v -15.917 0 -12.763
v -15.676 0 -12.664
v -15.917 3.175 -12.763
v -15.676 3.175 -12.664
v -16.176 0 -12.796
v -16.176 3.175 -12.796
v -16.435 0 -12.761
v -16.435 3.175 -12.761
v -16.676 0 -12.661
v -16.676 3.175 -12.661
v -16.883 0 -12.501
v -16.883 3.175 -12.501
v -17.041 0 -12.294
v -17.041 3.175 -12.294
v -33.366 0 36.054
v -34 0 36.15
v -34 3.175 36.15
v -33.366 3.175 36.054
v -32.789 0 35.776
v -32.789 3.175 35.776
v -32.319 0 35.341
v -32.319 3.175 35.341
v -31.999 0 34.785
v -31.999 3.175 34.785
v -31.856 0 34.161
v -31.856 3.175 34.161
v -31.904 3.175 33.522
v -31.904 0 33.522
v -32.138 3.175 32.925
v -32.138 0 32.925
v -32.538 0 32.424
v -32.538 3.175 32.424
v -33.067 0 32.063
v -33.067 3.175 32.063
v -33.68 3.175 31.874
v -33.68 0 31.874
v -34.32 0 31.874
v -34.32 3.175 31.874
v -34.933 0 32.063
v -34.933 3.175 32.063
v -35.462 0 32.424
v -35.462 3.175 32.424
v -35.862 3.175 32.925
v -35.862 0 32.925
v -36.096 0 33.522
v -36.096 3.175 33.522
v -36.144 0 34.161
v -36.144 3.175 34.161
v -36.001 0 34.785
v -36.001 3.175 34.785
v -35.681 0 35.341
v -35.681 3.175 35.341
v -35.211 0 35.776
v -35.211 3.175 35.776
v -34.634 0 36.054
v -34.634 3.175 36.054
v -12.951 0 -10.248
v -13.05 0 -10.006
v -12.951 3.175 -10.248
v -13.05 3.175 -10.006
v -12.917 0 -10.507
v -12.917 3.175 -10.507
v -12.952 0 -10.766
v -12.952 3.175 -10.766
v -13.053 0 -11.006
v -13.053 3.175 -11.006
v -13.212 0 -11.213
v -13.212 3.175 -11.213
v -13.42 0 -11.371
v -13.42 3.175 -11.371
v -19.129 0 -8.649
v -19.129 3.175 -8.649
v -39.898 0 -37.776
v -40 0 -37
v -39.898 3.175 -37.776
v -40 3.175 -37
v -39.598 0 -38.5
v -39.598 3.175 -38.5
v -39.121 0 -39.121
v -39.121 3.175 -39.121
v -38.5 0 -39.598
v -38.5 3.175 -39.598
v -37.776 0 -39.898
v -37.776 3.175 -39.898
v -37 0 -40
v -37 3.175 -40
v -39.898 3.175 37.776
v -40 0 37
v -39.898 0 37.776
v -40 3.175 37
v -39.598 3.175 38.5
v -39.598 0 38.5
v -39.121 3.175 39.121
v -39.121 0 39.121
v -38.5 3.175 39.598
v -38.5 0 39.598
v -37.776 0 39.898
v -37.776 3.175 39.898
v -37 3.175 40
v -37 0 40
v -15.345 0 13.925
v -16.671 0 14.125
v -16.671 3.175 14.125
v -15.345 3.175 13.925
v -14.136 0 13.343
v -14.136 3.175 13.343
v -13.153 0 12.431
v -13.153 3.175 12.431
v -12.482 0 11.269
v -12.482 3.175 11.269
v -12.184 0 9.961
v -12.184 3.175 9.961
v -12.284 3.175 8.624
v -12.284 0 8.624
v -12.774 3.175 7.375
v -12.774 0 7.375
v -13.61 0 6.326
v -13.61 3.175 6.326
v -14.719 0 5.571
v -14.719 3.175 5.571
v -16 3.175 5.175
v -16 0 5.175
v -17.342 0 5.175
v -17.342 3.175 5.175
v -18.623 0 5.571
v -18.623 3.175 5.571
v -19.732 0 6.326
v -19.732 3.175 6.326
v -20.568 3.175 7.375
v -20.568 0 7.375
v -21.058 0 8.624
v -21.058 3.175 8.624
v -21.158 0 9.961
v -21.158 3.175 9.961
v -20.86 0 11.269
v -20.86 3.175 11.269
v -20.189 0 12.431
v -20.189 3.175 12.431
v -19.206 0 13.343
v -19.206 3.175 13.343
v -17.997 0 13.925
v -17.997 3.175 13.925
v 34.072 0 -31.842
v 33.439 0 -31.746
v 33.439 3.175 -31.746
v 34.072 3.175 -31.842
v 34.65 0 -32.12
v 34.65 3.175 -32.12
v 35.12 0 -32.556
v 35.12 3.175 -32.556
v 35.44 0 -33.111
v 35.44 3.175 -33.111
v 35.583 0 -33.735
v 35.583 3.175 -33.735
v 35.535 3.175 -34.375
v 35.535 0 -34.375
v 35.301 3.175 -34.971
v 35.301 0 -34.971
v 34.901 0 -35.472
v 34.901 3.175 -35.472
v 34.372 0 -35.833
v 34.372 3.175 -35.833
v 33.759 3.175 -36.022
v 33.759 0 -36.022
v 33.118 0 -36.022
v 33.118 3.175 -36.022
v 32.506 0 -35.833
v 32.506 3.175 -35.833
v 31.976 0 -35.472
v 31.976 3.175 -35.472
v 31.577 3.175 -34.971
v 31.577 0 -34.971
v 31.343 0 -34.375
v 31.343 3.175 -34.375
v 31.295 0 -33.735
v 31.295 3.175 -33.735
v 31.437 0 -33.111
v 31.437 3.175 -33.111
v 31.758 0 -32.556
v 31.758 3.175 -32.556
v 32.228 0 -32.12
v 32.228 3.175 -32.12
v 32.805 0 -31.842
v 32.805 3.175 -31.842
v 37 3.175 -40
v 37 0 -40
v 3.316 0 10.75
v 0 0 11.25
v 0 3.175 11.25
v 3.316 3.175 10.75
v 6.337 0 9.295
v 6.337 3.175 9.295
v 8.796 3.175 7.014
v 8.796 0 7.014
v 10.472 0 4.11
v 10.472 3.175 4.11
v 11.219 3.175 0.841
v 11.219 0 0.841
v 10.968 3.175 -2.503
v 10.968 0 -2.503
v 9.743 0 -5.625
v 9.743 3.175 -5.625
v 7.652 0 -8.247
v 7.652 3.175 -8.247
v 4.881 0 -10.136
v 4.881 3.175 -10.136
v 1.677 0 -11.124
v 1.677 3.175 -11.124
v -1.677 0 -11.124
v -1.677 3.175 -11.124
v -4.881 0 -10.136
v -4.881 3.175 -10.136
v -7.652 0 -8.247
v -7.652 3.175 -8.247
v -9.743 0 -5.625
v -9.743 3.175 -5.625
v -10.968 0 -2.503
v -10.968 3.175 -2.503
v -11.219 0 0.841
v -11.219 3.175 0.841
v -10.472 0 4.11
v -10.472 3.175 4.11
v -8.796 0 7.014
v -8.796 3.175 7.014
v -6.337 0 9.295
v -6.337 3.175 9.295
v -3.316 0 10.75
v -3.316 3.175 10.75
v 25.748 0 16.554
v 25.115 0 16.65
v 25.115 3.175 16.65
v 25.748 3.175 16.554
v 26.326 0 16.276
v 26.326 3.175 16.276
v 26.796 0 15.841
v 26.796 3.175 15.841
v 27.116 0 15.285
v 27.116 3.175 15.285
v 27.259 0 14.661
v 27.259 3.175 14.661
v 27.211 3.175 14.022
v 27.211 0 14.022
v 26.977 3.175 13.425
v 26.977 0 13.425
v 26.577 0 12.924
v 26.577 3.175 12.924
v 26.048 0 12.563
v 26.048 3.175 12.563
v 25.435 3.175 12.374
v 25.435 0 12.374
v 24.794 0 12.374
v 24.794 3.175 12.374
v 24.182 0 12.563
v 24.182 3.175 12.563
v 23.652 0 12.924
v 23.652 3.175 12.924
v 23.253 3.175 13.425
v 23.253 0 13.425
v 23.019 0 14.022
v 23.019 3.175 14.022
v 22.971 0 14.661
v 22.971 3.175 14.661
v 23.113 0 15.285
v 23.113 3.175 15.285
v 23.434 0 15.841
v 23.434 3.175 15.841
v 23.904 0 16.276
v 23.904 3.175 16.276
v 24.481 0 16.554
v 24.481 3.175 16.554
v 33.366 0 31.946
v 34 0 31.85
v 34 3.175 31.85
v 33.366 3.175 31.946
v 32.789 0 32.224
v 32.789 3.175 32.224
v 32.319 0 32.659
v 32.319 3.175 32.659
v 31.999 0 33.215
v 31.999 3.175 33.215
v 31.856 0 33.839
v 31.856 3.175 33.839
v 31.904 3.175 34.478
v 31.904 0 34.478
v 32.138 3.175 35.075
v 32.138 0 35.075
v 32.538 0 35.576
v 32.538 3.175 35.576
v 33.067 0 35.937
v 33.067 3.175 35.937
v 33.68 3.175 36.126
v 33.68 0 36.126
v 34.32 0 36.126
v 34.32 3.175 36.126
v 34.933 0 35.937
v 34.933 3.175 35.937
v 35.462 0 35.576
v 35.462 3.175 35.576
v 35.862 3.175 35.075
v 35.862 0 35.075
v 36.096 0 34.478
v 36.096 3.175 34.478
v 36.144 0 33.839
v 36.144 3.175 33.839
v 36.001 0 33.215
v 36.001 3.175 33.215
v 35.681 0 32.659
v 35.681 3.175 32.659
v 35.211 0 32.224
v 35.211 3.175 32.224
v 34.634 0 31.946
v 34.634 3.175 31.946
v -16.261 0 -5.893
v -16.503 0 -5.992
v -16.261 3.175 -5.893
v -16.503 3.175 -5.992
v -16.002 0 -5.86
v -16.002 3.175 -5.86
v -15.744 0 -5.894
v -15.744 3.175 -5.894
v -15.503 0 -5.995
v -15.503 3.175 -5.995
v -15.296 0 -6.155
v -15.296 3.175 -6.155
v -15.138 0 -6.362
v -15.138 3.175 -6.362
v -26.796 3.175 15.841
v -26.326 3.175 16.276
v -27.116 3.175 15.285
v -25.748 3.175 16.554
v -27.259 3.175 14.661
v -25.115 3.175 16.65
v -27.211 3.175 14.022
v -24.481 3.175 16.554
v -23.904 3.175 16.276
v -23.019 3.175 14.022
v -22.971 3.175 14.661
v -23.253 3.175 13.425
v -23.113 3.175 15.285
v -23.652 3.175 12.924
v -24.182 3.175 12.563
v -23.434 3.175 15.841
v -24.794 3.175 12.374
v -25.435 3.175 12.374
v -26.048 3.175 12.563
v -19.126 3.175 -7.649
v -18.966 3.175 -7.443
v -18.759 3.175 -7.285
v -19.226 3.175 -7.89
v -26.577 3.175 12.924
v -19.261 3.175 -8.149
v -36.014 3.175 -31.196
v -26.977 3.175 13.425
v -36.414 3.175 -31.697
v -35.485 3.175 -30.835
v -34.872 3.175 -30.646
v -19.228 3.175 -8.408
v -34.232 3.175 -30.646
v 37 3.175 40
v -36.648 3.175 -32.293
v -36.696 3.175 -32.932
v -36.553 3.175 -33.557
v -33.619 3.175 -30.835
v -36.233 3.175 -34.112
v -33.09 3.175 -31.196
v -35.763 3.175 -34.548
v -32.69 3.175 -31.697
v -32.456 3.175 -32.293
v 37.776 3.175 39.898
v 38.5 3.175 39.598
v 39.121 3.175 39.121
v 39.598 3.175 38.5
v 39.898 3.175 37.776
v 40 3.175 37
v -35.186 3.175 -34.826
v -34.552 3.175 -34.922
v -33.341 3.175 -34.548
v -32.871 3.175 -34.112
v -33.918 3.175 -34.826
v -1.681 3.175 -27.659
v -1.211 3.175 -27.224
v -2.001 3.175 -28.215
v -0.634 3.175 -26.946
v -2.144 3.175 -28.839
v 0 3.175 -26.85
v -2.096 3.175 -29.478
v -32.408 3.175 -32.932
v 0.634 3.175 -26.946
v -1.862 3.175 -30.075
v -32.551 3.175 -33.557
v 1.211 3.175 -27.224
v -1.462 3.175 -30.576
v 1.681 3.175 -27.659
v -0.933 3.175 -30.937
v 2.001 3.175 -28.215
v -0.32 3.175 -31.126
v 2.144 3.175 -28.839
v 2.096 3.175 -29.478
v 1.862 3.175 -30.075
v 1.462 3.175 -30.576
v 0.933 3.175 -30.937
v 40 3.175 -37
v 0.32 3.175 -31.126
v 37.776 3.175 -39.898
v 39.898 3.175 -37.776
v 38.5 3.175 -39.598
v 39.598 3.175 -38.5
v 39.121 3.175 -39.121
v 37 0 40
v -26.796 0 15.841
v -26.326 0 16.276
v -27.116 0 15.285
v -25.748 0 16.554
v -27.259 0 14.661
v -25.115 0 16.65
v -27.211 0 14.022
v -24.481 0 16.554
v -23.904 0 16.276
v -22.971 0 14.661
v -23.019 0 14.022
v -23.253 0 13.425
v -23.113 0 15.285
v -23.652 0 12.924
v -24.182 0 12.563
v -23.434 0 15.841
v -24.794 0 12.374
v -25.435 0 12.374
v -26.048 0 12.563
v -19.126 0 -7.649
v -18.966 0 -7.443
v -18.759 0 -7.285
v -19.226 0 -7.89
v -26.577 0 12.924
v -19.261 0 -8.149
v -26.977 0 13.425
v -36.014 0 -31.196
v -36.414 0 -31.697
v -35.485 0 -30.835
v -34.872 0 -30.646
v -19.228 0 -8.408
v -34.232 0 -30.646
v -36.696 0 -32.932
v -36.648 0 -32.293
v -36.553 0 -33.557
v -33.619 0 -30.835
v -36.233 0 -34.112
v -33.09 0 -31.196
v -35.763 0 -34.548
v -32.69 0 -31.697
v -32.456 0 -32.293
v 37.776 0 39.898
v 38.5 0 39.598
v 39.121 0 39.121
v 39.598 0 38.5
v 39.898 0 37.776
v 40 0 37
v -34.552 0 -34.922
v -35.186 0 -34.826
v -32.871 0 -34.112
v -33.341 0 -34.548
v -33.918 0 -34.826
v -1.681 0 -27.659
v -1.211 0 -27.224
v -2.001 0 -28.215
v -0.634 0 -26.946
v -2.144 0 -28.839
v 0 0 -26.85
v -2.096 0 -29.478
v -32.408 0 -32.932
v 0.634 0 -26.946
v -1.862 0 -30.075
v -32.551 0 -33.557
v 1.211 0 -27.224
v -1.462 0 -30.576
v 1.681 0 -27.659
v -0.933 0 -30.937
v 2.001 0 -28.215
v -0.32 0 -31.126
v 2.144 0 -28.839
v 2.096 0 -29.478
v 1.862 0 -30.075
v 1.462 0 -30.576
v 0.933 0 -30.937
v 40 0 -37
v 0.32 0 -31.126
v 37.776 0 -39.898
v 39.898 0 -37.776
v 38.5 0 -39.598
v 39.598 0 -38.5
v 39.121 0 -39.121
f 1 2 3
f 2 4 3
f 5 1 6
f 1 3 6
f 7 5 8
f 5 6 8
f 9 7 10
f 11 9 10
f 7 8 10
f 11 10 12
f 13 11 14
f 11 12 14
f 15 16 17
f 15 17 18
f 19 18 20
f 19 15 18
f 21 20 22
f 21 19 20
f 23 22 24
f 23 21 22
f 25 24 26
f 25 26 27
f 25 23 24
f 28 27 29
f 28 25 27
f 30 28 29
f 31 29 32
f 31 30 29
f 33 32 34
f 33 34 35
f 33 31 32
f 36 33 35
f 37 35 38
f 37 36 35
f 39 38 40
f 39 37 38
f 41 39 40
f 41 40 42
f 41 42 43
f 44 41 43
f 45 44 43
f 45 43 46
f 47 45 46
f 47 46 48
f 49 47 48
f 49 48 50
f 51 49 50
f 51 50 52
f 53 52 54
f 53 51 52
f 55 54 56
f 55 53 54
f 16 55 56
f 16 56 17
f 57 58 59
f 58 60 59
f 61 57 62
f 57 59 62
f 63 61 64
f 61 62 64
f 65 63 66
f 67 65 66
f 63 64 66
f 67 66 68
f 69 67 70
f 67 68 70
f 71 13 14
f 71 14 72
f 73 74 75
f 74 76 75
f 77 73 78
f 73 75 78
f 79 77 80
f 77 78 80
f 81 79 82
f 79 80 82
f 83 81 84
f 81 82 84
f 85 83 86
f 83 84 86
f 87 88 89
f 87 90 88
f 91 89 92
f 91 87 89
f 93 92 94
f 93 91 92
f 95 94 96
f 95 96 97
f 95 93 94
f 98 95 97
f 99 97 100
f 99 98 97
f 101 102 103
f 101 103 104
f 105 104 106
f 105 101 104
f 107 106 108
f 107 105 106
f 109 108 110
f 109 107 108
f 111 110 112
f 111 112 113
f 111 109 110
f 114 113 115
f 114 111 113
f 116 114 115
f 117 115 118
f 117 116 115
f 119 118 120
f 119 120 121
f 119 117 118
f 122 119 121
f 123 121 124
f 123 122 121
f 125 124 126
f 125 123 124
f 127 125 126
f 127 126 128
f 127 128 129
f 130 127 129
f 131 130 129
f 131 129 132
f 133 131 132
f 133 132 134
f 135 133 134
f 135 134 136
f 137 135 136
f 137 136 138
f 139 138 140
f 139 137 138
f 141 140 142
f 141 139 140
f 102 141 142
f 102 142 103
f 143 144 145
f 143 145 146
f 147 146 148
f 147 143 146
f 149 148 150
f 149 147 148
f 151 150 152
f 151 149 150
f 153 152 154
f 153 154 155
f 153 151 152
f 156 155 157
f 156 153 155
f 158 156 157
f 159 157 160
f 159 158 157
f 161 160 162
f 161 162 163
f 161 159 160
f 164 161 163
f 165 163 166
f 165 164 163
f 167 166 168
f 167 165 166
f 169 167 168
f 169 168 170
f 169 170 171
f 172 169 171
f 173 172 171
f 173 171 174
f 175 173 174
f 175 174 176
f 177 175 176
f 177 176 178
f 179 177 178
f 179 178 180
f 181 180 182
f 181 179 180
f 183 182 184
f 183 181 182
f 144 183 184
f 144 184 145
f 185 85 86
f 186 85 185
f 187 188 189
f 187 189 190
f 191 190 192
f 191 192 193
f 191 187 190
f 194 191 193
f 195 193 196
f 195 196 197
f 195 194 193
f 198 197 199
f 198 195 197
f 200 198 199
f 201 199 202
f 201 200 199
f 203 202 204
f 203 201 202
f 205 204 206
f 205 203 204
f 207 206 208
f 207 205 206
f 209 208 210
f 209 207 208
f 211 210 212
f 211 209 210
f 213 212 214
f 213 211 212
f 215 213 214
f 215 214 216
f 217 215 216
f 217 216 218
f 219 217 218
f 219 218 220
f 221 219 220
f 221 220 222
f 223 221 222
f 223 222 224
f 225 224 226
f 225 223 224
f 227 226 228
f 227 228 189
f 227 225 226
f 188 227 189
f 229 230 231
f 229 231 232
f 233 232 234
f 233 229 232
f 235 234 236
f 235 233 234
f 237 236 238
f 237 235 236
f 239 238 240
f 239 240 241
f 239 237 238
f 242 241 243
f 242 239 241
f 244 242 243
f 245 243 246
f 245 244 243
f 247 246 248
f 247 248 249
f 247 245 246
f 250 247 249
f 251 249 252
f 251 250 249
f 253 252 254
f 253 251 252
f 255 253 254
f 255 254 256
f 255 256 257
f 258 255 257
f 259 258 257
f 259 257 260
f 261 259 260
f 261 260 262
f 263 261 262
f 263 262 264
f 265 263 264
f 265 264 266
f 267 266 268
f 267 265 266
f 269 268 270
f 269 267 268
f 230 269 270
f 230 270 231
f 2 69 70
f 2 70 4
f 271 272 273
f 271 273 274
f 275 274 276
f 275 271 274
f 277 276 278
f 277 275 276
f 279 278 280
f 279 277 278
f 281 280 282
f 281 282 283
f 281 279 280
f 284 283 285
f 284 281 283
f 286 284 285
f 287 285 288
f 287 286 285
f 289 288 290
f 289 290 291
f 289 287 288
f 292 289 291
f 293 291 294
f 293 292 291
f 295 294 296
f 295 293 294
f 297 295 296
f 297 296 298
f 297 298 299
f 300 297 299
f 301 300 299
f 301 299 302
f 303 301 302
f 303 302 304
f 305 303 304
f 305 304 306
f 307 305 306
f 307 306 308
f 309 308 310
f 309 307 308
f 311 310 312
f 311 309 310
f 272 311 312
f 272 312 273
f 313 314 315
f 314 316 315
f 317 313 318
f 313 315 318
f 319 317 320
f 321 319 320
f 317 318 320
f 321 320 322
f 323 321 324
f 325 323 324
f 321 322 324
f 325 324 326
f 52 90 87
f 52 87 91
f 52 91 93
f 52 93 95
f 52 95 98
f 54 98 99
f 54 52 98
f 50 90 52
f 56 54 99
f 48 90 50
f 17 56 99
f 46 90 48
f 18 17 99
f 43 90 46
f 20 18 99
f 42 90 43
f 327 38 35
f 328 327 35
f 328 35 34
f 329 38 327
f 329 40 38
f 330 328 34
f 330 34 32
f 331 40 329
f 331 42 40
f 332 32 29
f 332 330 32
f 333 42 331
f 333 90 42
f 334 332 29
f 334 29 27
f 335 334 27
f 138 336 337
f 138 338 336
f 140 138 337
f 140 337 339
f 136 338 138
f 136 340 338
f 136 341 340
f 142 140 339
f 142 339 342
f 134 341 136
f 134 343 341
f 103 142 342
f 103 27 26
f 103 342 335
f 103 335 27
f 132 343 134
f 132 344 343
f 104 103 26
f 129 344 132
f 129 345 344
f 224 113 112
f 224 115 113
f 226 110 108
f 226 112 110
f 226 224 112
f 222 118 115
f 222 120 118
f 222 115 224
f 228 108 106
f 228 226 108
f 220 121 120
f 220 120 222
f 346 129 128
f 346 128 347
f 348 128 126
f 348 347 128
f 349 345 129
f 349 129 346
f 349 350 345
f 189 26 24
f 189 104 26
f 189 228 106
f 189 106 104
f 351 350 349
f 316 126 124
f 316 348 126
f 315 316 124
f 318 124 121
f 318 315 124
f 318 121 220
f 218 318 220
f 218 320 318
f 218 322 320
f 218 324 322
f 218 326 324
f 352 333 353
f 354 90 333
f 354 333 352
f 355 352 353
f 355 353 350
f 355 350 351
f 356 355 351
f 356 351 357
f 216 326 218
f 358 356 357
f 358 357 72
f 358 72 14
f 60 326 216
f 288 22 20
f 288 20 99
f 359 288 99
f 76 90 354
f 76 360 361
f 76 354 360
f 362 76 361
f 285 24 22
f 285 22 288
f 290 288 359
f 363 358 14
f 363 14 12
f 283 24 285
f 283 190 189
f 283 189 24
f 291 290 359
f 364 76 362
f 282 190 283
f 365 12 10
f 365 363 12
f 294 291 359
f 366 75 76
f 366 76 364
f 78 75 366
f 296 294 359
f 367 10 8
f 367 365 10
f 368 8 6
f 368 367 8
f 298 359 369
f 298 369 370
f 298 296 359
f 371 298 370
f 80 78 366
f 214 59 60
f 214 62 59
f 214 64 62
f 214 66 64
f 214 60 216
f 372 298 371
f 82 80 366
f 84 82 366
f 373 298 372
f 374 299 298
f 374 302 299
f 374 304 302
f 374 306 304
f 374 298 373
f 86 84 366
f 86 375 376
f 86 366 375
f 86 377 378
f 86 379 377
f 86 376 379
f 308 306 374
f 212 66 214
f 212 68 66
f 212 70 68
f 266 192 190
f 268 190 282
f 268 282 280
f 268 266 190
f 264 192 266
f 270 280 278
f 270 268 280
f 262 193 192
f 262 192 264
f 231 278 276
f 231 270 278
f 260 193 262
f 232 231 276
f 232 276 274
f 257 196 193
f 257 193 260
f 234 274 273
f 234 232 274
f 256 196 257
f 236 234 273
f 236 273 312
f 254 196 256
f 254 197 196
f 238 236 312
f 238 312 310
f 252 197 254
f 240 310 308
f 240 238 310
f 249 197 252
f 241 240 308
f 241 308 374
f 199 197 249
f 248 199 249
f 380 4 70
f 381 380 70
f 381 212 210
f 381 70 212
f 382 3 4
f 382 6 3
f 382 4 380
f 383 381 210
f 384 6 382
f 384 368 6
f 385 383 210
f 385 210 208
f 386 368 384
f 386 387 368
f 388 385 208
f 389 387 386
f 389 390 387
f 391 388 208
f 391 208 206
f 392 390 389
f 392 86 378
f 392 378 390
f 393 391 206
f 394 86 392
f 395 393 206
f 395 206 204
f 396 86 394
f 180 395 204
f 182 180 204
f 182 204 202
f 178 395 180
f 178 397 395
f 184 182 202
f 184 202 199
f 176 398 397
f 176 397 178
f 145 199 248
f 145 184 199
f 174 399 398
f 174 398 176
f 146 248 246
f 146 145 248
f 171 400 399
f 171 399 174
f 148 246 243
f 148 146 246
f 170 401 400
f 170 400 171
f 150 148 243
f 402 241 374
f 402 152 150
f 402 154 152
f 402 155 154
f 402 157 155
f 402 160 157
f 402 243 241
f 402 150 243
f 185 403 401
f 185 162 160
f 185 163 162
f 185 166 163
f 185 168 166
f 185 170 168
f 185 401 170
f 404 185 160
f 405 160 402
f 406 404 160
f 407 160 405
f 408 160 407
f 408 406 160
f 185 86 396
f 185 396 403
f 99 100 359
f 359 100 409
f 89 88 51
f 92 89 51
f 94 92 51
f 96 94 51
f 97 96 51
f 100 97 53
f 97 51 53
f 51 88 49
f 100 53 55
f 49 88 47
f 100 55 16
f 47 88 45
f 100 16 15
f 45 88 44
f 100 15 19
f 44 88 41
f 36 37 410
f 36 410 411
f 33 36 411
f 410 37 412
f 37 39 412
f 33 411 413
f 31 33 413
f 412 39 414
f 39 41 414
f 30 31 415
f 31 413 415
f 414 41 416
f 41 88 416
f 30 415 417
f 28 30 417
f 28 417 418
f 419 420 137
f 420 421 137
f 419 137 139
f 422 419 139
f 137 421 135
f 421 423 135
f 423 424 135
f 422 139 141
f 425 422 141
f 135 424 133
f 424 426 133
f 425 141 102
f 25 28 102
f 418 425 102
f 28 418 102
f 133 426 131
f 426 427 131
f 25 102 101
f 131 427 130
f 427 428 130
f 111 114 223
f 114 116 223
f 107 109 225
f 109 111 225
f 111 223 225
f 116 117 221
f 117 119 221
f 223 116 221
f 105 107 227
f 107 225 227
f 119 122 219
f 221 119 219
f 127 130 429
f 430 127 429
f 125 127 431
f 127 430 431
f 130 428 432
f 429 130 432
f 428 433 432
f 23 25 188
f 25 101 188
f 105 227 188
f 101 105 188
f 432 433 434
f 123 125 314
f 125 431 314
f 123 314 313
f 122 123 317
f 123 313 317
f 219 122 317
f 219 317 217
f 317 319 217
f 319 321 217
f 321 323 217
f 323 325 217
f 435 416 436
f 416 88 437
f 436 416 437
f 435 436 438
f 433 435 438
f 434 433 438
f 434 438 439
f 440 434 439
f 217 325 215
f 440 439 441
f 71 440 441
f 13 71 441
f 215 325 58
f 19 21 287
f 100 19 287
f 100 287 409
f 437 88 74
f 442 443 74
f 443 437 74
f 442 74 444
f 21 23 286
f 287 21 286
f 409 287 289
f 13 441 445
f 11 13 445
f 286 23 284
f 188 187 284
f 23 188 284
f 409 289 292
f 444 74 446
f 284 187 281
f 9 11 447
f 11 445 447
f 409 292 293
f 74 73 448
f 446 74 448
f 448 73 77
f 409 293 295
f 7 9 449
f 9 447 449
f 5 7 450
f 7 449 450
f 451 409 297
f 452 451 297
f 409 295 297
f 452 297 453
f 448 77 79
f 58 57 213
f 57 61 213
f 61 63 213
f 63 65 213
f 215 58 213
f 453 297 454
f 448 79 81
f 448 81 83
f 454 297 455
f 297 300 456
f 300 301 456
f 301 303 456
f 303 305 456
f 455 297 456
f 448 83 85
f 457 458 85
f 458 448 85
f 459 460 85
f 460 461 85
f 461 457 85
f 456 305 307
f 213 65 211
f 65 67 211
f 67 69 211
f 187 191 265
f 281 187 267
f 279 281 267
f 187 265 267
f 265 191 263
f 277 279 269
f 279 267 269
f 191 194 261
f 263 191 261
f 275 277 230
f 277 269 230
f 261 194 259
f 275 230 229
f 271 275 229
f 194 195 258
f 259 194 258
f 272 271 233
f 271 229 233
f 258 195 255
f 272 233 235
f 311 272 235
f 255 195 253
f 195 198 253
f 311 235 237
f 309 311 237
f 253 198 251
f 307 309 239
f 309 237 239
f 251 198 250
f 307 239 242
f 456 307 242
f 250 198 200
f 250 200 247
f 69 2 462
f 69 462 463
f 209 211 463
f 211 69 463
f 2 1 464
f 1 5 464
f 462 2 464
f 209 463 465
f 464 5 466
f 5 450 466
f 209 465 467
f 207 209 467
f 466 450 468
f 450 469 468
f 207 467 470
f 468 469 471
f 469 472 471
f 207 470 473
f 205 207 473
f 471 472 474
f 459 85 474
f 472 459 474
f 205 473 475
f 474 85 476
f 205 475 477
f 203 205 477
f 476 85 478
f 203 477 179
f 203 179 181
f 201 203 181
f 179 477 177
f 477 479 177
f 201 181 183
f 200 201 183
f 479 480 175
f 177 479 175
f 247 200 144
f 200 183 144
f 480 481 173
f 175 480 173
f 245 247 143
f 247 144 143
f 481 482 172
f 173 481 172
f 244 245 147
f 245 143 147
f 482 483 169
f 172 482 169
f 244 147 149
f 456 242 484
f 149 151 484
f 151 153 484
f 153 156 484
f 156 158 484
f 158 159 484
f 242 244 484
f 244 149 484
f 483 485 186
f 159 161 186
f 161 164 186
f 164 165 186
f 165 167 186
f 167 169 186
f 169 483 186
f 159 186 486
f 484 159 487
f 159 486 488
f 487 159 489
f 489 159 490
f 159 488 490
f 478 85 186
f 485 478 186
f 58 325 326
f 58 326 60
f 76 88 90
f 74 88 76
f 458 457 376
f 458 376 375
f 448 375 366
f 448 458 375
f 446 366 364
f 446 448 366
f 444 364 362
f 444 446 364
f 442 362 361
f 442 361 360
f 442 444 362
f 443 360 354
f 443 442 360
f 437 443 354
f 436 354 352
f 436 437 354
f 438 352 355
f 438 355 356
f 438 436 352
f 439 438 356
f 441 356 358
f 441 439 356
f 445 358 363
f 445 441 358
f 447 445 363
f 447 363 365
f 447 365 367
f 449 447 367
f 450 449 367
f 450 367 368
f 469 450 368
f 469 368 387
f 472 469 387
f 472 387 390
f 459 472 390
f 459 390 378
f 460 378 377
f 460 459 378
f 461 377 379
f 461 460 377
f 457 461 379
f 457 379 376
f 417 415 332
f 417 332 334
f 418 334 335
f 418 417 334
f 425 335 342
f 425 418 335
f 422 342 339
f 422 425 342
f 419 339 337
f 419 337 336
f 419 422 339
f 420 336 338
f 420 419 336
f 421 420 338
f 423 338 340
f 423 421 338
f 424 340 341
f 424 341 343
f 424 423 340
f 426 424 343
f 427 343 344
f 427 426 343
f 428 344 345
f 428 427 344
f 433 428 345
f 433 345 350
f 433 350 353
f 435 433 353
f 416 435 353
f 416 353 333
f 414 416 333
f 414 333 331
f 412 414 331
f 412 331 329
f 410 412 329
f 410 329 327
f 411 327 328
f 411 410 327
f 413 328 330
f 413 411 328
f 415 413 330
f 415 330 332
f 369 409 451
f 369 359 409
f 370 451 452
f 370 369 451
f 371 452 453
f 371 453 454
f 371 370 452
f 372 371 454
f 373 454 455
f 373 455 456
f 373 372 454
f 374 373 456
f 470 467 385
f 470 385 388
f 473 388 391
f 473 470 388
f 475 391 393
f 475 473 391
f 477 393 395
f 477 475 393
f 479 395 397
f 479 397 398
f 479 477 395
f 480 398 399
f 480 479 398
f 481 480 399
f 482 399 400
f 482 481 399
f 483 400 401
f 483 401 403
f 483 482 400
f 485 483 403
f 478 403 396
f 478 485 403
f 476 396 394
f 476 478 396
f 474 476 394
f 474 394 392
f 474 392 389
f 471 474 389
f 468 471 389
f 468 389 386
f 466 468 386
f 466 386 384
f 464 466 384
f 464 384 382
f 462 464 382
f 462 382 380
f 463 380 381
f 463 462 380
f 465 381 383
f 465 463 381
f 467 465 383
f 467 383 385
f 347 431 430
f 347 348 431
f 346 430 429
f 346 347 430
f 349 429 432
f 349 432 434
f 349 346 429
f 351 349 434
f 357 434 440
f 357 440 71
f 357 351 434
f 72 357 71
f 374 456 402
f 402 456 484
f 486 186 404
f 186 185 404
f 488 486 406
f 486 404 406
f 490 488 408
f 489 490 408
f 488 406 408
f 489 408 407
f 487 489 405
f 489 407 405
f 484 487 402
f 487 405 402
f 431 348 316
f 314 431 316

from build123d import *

# Parameters (mm, degrees)
SKETCH1_W           = 80
SKETCH1_H           = 80
SKETCH1_R           = 11.25
SKETCH1_R_2         = 2.15
SKETCH1_R_3         = 4.5
BOSS_EXTRUDE1_DEPTH = 3.175
FILLET1_R           = 3
FILLET2_R           = 1


with BuildPart() as part:
    # Sketch1 → Boss-Extrude1 (new body)
    with BuildSketch(Plane(origin=(0, 0, 0), x_dir=(1, 0, 0), z_dir=(0, 1, 0))):
        Rectangle(SKETCH1_W, SKETCH1_H)
        with Locations(Location((0, 0, 0), (0, 0, 270))):
            Circle(SKETCH1_R, mode=Mode.SUBTRACT)
        with Locations(Location((0, 29, 0), (0, 0, 270))):
            Circle(SKETCH1_R_2, mode=Mode.SUBTRACT)
        with Locations(Location((25.11473671, -14.5, 0), (0, 0, 270))):
            Circle(SKETCH1_R_2, mode=Mode.SUBTRACT)
        with Locations(Location((-25.11473671, -14.5, 0), (0, 0, 270))):
            Circle(SKETCH1_R_2, mode=Mode.SUBTRACT)
        with Locations(Location((-34, -34, 0), (0, 0, 270))):
            Circle(SKETCH1_R_2, mode=Mode.SUBTRACT)
        with Locations(Location((34, -34, 0), (0, 0, 90))):
            Circle(SKETCH1_R_2, mode=Mode.SUBTRACT)
        with Locations(Location((33.43865922, 33.896147379, 0), (0, 0, 270))):
            Circle(SKETCH1_R_2, mode=Mode.SUBTRACT)
        with Locations(Location((-34.552045293, 32.77182544, 0), (0, 0, 90))):
            Circle(SKETCH1_R_2, mode=Mode.SUBTRACT)
        with Locations(Location((-16.670989023, -9.625, 0), (0, 0, 270))):
            Circle(SKETCH1_R_3, mode=Mode.SUBTRACT)
        Polygon((-19.626238937, 7.781840133), (-15.635110011, 5.494726254), (-12.552478261, 10.874073937), (-16.543607188, 13.161187816), align=None, mode=Mode.SUBTRACT)
    extrude(amount=BOSS_EXTRUDE1_DEPTH)

    # Fillet1
    fillet1_edges = [part.edges().sort_by_distance(p)[0] for p in [
        (40, 1.5875, 40),
        (-40, 1.5875, 40),
        (-40, 1.5875, -40),
        (40, 1.5875, -40),
    ]]
    fillet(fillet1_edges, radius=FILLET1_R)

    # Fillet2
    fillet2_edges = [part.edges().sort_by_distance(p)[0] for p in [
        (-16.543607188, 1.5875, -13.161187816),
        (-19.626238937, 1.5875, -7.781840133),
        (-15.635110011, 1.5875, -5.494726254),
        (-12.552478261, 1.5875, -10.874073937),
    ]]
    fillet(fillet2_edges, radius=FILLET2_R)


solid = part.part
